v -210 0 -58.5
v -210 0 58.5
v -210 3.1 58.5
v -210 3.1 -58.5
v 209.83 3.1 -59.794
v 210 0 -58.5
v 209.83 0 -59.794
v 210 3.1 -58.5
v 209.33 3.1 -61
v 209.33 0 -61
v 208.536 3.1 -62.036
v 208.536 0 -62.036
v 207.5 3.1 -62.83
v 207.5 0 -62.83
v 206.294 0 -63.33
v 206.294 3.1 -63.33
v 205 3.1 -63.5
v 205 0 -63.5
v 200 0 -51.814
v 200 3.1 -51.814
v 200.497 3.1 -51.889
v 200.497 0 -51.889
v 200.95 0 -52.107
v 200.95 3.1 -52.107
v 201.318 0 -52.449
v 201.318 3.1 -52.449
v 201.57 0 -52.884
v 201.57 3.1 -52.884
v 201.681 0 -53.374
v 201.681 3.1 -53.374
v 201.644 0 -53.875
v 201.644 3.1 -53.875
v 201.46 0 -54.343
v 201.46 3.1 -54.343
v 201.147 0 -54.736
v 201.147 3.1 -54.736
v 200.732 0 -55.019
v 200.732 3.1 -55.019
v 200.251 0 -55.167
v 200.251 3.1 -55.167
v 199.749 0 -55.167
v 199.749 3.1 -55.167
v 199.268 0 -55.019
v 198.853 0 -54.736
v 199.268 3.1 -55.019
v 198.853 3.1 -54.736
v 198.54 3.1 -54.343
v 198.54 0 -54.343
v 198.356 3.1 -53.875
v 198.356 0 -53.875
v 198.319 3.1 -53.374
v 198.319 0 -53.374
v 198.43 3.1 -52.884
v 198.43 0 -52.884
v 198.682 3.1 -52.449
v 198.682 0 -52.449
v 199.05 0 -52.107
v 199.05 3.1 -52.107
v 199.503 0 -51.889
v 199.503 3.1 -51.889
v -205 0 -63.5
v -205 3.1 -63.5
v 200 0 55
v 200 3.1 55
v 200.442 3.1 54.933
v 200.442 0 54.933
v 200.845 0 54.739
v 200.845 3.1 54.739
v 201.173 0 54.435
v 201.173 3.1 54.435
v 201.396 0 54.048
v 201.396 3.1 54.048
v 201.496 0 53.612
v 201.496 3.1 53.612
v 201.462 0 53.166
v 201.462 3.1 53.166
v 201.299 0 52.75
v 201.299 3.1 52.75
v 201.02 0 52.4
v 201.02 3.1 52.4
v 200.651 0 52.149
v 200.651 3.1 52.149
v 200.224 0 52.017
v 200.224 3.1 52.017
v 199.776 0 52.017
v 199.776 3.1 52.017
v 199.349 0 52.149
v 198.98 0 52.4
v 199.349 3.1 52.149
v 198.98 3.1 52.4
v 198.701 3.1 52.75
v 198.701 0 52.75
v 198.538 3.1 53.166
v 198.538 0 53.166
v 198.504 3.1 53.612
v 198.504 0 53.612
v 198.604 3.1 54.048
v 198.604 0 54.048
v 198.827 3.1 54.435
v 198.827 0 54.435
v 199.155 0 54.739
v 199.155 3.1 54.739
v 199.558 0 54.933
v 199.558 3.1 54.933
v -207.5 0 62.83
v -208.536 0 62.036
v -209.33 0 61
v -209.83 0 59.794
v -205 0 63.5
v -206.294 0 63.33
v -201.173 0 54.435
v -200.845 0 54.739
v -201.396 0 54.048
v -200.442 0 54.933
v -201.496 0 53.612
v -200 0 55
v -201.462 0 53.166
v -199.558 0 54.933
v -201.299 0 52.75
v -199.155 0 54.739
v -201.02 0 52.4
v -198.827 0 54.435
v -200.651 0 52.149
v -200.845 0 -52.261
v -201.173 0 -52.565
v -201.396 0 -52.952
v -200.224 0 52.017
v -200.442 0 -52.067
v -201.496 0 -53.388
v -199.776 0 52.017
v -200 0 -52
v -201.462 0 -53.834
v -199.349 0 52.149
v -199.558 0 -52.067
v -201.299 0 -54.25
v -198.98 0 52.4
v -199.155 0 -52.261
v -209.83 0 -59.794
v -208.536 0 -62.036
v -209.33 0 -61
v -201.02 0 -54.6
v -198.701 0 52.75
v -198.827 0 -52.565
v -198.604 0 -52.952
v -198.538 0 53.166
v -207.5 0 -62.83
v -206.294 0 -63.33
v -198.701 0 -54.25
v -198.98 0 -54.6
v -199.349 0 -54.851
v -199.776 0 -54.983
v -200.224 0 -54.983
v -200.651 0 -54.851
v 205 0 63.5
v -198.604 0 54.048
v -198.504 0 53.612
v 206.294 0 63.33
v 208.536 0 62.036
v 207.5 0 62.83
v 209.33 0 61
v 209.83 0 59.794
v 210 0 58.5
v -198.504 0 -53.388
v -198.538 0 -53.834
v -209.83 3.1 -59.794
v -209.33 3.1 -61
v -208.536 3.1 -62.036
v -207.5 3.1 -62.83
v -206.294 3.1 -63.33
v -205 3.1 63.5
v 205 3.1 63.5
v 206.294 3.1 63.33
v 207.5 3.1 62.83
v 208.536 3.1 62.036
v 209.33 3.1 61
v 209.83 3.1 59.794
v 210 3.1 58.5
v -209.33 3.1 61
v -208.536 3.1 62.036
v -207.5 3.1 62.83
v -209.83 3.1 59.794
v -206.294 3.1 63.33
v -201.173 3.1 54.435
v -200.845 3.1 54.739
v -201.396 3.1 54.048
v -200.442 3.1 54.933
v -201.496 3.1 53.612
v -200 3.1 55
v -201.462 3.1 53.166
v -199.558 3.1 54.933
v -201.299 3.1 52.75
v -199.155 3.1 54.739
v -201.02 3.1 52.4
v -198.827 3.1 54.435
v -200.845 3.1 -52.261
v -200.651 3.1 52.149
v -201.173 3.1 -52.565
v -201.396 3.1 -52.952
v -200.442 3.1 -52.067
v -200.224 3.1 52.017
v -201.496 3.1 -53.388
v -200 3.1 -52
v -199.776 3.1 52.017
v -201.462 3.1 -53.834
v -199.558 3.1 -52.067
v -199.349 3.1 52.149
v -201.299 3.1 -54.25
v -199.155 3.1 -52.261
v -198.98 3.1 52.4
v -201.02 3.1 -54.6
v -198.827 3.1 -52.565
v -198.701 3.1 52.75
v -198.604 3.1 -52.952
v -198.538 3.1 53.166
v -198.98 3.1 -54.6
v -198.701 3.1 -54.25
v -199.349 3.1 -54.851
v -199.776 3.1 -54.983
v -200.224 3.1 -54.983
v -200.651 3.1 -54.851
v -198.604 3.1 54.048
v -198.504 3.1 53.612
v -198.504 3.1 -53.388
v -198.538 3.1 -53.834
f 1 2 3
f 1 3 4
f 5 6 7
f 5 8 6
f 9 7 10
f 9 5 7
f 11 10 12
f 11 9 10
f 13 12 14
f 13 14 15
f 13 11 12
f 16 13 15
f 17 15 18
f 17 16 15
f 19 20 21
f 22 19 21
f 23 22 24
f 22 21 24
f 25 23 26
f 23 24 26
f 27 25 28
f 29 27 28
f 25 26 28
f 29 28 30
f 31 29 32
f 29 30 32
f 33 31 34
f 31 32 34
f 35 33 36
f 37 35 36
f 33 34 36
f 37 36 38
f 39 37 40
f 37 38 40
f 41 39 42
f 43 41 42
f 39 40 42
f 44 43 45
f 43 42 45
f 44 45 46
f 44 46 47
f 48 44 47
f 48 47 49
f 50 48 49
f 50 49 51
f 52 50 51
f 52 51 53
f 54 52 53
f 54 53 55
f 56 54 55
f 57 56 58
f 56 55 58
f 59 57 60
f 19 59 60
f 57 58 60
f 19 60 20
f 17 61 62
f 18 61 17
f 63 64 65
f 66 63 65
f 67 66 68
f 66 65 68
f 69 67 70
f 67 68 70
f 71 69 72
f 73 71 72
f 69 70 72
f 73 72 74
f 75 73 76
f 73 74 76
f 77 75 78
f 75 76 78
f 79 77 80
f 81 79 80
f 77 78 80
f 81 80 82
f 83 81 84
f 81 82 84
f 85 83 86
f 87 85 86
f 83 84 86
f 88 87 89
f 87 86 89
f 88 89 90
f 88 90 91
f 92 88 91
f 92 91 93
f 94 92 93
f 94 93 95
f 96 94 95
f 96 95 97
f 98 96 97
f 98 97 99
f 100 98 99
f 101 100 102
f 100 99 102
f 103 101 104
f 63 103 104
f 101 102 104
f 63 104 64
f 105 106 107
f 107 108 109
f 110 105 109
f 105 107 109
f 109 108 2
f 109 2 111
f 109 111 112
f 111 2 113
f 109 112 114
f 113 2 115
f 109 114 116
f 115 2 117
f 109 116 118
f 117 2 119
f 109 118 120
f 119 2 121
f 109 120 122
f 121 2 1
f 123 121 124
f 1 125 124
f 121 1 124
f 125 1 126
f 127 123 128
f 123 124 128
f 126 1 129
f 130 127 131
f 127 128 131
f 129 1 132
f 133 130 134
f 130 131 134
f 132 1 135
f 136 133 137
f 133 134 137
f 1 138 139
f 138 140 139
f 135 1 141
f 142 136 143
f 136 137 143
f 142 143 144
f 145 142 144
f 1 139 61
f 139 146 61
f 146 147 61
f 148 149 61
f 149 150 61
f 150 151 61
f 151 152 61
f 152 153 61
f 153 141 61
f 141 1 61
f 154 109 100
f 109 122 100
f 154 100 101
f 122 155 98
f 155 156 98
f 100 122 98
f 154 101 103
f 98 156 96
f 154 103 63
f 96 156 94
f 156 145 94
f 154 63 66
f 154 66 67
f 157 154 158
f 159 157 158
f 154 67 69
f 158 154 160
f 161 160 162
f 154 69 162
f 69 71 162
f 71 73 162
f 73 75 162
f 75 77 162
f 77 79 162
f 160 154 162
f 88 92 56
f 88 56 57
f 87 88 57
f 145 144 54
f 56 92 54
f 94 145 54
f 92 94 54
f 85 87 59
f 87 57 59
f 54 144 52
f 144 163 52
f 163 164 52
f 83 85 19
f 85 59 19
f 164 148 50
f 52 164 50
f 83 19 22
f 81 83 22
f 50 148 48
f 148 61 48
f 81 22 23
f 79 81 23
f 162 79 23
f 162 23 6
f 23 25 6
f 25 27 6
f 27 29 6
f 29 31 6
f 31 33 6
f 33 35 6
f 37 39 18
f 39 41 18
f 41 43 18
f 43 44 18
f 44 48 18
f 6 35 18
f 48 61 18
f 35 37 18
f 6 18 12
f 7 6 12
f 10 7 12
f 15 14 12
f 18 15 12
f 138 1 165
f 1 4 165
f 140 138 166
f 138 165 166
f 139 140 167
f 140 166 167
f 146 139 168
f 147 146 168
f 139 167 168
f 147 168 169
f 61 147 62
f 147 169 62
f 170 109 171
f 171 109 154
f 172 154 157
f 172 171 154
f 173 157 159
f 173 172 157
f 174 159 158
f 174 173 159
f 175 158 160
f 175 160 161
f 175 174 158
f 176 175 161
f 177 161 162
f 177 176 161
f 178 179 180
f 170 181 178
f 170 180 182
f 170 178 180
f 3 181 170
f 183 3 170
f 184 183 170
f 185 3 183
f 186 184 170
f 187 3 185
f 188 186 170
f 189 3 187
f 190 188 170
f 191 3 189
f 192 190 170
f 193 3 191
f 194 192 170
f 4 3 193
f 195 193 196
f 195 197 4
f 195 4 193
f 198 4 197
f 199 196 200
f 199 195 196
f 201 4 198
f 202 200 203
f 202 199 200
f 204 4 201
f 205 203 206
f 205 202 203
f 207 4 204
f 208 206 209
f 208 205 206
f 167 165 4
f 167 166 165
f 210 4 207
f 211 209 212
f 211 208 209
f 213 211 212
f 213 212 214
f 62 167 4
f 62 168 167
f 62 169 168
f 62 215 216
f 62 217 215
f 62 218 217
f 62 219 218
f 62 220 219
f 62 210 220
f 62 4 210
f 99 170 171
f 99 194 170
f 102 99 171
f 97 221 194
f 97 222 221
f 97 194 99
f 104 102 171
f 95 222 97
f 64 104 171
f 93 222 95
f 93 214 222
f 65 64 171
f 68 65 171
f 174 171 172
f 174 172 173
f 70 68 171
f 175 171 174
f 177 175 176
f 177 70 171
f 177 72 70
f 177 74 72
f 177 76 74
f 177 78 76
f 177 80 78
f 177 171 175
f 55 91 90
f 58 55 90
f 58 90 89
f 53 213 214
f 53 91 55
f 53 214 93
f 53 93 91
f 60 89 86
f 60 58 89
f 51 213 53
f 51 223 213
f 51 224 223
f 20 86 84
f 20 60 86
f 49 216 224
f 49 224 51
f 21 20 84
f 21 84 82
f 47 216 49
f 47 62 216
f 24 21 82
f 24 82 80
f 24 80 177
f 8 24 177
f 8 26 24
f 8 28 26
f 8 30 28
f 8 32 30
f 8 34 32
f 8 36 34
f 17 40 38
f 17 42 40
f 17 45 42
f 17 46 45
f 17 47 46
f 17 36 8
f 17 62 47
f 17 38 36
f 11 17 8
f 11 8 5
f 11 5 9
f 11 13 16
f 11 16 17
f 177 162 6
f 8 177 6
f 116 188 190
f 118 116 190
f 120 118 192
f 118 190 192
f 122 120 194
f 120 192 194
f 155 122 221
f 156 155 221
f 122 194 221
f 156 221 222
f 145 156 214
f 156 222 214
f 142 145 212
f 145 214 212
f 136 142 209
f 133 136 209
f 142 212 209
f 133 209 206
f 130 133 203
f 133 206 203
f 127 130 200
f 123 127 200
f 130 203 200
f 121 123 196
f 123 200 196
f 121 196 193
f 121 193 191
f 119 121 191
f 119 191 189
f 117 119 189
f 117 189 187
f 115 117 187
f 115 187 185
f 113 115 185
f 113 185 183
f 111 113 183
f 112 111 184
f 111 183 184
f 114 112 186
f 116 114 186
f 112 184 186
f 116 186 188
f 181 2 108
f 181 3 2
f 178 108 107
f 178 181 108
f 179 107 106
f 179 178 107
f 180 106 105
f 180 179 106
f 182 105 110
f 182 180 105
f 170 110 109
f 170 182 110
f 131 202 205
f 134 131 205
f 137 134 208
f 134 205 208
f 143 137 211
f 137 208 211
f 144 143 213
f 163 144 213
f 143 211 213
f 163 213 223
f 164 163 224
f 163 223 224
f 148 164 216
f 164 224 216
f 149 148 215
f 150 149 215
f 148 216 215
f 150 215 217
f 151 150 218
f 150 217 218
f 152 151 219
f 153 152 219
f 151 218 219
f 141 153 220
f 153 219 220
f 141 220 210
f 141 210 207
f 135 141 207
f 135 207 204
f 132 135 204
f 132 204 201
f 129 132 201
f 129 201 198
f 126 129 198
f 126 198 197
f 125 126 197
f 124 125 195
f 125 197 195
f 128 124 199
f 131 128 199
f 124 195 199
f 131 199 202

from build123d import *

# Parameters (mm, degrees)
SKETCH1_W           = 420
SKETCH1_H           = 127
BOSS_EXTRUDE1_DEPTH = 3.1
FILLET1_R           = 5
SKETCH3_R           = 1.5
SKETCH3_R_2         = 1.68611488
CUT_EXTRUDE1_DEPTH  = 3.1


with BuildPart() as part:
    # Sketch1 → Boss-Extrude1 (new body)
    with BuildSketch(Plane(origin=(0, 0, 0), x_dir=(1, 0, 0), z_dir=(0, 1, 0))):
        Rectangle(SKETCH1_W, SKETCH1_H)
    extrude(amount=BOSS_EXTRUDE1_DEPTH)

    # Fillet1
    fillet1_edges = [part.edges().sort_by_distance(p)[0] for p in [
        (210, 1.55, 63.5),
        (-210, 1.55, 63.5),
        (-210, 1.55, -63.5),
        (210, 1.55, -63.5),
    ]]
    fillet(fillet1_edges, radius=FILLET1_R)

    # Sketch3 → Cut-Extrude1 (cut)
    with BuildSketch(Plane(origin=(0, 3.1, 0), x_dir=(1, 0, 0), z_dir=(0, 1, 0))):
        with Locations(Location((-200, 53.5, 0), (0, 0, 270))):
            Circle(SKETCH3_R)
        with Locations(Location((-200, -53.5, 0), (0, 0, 270))):
            Circle(SKETCH3_R)
        with Locations(Location((200, 53.5, 0), (0, 0, 270))):
            Circle(SKETCH3_R_2)
        with Locations(Location((200, -53.5, 0), (0, 0, 270))):
            Circle(SKETCH3_R)
    extrude(amount=-CUT_EXTRUDE1_DEPTH, mode=Mode.SUBTRACT)


solid = part.part
